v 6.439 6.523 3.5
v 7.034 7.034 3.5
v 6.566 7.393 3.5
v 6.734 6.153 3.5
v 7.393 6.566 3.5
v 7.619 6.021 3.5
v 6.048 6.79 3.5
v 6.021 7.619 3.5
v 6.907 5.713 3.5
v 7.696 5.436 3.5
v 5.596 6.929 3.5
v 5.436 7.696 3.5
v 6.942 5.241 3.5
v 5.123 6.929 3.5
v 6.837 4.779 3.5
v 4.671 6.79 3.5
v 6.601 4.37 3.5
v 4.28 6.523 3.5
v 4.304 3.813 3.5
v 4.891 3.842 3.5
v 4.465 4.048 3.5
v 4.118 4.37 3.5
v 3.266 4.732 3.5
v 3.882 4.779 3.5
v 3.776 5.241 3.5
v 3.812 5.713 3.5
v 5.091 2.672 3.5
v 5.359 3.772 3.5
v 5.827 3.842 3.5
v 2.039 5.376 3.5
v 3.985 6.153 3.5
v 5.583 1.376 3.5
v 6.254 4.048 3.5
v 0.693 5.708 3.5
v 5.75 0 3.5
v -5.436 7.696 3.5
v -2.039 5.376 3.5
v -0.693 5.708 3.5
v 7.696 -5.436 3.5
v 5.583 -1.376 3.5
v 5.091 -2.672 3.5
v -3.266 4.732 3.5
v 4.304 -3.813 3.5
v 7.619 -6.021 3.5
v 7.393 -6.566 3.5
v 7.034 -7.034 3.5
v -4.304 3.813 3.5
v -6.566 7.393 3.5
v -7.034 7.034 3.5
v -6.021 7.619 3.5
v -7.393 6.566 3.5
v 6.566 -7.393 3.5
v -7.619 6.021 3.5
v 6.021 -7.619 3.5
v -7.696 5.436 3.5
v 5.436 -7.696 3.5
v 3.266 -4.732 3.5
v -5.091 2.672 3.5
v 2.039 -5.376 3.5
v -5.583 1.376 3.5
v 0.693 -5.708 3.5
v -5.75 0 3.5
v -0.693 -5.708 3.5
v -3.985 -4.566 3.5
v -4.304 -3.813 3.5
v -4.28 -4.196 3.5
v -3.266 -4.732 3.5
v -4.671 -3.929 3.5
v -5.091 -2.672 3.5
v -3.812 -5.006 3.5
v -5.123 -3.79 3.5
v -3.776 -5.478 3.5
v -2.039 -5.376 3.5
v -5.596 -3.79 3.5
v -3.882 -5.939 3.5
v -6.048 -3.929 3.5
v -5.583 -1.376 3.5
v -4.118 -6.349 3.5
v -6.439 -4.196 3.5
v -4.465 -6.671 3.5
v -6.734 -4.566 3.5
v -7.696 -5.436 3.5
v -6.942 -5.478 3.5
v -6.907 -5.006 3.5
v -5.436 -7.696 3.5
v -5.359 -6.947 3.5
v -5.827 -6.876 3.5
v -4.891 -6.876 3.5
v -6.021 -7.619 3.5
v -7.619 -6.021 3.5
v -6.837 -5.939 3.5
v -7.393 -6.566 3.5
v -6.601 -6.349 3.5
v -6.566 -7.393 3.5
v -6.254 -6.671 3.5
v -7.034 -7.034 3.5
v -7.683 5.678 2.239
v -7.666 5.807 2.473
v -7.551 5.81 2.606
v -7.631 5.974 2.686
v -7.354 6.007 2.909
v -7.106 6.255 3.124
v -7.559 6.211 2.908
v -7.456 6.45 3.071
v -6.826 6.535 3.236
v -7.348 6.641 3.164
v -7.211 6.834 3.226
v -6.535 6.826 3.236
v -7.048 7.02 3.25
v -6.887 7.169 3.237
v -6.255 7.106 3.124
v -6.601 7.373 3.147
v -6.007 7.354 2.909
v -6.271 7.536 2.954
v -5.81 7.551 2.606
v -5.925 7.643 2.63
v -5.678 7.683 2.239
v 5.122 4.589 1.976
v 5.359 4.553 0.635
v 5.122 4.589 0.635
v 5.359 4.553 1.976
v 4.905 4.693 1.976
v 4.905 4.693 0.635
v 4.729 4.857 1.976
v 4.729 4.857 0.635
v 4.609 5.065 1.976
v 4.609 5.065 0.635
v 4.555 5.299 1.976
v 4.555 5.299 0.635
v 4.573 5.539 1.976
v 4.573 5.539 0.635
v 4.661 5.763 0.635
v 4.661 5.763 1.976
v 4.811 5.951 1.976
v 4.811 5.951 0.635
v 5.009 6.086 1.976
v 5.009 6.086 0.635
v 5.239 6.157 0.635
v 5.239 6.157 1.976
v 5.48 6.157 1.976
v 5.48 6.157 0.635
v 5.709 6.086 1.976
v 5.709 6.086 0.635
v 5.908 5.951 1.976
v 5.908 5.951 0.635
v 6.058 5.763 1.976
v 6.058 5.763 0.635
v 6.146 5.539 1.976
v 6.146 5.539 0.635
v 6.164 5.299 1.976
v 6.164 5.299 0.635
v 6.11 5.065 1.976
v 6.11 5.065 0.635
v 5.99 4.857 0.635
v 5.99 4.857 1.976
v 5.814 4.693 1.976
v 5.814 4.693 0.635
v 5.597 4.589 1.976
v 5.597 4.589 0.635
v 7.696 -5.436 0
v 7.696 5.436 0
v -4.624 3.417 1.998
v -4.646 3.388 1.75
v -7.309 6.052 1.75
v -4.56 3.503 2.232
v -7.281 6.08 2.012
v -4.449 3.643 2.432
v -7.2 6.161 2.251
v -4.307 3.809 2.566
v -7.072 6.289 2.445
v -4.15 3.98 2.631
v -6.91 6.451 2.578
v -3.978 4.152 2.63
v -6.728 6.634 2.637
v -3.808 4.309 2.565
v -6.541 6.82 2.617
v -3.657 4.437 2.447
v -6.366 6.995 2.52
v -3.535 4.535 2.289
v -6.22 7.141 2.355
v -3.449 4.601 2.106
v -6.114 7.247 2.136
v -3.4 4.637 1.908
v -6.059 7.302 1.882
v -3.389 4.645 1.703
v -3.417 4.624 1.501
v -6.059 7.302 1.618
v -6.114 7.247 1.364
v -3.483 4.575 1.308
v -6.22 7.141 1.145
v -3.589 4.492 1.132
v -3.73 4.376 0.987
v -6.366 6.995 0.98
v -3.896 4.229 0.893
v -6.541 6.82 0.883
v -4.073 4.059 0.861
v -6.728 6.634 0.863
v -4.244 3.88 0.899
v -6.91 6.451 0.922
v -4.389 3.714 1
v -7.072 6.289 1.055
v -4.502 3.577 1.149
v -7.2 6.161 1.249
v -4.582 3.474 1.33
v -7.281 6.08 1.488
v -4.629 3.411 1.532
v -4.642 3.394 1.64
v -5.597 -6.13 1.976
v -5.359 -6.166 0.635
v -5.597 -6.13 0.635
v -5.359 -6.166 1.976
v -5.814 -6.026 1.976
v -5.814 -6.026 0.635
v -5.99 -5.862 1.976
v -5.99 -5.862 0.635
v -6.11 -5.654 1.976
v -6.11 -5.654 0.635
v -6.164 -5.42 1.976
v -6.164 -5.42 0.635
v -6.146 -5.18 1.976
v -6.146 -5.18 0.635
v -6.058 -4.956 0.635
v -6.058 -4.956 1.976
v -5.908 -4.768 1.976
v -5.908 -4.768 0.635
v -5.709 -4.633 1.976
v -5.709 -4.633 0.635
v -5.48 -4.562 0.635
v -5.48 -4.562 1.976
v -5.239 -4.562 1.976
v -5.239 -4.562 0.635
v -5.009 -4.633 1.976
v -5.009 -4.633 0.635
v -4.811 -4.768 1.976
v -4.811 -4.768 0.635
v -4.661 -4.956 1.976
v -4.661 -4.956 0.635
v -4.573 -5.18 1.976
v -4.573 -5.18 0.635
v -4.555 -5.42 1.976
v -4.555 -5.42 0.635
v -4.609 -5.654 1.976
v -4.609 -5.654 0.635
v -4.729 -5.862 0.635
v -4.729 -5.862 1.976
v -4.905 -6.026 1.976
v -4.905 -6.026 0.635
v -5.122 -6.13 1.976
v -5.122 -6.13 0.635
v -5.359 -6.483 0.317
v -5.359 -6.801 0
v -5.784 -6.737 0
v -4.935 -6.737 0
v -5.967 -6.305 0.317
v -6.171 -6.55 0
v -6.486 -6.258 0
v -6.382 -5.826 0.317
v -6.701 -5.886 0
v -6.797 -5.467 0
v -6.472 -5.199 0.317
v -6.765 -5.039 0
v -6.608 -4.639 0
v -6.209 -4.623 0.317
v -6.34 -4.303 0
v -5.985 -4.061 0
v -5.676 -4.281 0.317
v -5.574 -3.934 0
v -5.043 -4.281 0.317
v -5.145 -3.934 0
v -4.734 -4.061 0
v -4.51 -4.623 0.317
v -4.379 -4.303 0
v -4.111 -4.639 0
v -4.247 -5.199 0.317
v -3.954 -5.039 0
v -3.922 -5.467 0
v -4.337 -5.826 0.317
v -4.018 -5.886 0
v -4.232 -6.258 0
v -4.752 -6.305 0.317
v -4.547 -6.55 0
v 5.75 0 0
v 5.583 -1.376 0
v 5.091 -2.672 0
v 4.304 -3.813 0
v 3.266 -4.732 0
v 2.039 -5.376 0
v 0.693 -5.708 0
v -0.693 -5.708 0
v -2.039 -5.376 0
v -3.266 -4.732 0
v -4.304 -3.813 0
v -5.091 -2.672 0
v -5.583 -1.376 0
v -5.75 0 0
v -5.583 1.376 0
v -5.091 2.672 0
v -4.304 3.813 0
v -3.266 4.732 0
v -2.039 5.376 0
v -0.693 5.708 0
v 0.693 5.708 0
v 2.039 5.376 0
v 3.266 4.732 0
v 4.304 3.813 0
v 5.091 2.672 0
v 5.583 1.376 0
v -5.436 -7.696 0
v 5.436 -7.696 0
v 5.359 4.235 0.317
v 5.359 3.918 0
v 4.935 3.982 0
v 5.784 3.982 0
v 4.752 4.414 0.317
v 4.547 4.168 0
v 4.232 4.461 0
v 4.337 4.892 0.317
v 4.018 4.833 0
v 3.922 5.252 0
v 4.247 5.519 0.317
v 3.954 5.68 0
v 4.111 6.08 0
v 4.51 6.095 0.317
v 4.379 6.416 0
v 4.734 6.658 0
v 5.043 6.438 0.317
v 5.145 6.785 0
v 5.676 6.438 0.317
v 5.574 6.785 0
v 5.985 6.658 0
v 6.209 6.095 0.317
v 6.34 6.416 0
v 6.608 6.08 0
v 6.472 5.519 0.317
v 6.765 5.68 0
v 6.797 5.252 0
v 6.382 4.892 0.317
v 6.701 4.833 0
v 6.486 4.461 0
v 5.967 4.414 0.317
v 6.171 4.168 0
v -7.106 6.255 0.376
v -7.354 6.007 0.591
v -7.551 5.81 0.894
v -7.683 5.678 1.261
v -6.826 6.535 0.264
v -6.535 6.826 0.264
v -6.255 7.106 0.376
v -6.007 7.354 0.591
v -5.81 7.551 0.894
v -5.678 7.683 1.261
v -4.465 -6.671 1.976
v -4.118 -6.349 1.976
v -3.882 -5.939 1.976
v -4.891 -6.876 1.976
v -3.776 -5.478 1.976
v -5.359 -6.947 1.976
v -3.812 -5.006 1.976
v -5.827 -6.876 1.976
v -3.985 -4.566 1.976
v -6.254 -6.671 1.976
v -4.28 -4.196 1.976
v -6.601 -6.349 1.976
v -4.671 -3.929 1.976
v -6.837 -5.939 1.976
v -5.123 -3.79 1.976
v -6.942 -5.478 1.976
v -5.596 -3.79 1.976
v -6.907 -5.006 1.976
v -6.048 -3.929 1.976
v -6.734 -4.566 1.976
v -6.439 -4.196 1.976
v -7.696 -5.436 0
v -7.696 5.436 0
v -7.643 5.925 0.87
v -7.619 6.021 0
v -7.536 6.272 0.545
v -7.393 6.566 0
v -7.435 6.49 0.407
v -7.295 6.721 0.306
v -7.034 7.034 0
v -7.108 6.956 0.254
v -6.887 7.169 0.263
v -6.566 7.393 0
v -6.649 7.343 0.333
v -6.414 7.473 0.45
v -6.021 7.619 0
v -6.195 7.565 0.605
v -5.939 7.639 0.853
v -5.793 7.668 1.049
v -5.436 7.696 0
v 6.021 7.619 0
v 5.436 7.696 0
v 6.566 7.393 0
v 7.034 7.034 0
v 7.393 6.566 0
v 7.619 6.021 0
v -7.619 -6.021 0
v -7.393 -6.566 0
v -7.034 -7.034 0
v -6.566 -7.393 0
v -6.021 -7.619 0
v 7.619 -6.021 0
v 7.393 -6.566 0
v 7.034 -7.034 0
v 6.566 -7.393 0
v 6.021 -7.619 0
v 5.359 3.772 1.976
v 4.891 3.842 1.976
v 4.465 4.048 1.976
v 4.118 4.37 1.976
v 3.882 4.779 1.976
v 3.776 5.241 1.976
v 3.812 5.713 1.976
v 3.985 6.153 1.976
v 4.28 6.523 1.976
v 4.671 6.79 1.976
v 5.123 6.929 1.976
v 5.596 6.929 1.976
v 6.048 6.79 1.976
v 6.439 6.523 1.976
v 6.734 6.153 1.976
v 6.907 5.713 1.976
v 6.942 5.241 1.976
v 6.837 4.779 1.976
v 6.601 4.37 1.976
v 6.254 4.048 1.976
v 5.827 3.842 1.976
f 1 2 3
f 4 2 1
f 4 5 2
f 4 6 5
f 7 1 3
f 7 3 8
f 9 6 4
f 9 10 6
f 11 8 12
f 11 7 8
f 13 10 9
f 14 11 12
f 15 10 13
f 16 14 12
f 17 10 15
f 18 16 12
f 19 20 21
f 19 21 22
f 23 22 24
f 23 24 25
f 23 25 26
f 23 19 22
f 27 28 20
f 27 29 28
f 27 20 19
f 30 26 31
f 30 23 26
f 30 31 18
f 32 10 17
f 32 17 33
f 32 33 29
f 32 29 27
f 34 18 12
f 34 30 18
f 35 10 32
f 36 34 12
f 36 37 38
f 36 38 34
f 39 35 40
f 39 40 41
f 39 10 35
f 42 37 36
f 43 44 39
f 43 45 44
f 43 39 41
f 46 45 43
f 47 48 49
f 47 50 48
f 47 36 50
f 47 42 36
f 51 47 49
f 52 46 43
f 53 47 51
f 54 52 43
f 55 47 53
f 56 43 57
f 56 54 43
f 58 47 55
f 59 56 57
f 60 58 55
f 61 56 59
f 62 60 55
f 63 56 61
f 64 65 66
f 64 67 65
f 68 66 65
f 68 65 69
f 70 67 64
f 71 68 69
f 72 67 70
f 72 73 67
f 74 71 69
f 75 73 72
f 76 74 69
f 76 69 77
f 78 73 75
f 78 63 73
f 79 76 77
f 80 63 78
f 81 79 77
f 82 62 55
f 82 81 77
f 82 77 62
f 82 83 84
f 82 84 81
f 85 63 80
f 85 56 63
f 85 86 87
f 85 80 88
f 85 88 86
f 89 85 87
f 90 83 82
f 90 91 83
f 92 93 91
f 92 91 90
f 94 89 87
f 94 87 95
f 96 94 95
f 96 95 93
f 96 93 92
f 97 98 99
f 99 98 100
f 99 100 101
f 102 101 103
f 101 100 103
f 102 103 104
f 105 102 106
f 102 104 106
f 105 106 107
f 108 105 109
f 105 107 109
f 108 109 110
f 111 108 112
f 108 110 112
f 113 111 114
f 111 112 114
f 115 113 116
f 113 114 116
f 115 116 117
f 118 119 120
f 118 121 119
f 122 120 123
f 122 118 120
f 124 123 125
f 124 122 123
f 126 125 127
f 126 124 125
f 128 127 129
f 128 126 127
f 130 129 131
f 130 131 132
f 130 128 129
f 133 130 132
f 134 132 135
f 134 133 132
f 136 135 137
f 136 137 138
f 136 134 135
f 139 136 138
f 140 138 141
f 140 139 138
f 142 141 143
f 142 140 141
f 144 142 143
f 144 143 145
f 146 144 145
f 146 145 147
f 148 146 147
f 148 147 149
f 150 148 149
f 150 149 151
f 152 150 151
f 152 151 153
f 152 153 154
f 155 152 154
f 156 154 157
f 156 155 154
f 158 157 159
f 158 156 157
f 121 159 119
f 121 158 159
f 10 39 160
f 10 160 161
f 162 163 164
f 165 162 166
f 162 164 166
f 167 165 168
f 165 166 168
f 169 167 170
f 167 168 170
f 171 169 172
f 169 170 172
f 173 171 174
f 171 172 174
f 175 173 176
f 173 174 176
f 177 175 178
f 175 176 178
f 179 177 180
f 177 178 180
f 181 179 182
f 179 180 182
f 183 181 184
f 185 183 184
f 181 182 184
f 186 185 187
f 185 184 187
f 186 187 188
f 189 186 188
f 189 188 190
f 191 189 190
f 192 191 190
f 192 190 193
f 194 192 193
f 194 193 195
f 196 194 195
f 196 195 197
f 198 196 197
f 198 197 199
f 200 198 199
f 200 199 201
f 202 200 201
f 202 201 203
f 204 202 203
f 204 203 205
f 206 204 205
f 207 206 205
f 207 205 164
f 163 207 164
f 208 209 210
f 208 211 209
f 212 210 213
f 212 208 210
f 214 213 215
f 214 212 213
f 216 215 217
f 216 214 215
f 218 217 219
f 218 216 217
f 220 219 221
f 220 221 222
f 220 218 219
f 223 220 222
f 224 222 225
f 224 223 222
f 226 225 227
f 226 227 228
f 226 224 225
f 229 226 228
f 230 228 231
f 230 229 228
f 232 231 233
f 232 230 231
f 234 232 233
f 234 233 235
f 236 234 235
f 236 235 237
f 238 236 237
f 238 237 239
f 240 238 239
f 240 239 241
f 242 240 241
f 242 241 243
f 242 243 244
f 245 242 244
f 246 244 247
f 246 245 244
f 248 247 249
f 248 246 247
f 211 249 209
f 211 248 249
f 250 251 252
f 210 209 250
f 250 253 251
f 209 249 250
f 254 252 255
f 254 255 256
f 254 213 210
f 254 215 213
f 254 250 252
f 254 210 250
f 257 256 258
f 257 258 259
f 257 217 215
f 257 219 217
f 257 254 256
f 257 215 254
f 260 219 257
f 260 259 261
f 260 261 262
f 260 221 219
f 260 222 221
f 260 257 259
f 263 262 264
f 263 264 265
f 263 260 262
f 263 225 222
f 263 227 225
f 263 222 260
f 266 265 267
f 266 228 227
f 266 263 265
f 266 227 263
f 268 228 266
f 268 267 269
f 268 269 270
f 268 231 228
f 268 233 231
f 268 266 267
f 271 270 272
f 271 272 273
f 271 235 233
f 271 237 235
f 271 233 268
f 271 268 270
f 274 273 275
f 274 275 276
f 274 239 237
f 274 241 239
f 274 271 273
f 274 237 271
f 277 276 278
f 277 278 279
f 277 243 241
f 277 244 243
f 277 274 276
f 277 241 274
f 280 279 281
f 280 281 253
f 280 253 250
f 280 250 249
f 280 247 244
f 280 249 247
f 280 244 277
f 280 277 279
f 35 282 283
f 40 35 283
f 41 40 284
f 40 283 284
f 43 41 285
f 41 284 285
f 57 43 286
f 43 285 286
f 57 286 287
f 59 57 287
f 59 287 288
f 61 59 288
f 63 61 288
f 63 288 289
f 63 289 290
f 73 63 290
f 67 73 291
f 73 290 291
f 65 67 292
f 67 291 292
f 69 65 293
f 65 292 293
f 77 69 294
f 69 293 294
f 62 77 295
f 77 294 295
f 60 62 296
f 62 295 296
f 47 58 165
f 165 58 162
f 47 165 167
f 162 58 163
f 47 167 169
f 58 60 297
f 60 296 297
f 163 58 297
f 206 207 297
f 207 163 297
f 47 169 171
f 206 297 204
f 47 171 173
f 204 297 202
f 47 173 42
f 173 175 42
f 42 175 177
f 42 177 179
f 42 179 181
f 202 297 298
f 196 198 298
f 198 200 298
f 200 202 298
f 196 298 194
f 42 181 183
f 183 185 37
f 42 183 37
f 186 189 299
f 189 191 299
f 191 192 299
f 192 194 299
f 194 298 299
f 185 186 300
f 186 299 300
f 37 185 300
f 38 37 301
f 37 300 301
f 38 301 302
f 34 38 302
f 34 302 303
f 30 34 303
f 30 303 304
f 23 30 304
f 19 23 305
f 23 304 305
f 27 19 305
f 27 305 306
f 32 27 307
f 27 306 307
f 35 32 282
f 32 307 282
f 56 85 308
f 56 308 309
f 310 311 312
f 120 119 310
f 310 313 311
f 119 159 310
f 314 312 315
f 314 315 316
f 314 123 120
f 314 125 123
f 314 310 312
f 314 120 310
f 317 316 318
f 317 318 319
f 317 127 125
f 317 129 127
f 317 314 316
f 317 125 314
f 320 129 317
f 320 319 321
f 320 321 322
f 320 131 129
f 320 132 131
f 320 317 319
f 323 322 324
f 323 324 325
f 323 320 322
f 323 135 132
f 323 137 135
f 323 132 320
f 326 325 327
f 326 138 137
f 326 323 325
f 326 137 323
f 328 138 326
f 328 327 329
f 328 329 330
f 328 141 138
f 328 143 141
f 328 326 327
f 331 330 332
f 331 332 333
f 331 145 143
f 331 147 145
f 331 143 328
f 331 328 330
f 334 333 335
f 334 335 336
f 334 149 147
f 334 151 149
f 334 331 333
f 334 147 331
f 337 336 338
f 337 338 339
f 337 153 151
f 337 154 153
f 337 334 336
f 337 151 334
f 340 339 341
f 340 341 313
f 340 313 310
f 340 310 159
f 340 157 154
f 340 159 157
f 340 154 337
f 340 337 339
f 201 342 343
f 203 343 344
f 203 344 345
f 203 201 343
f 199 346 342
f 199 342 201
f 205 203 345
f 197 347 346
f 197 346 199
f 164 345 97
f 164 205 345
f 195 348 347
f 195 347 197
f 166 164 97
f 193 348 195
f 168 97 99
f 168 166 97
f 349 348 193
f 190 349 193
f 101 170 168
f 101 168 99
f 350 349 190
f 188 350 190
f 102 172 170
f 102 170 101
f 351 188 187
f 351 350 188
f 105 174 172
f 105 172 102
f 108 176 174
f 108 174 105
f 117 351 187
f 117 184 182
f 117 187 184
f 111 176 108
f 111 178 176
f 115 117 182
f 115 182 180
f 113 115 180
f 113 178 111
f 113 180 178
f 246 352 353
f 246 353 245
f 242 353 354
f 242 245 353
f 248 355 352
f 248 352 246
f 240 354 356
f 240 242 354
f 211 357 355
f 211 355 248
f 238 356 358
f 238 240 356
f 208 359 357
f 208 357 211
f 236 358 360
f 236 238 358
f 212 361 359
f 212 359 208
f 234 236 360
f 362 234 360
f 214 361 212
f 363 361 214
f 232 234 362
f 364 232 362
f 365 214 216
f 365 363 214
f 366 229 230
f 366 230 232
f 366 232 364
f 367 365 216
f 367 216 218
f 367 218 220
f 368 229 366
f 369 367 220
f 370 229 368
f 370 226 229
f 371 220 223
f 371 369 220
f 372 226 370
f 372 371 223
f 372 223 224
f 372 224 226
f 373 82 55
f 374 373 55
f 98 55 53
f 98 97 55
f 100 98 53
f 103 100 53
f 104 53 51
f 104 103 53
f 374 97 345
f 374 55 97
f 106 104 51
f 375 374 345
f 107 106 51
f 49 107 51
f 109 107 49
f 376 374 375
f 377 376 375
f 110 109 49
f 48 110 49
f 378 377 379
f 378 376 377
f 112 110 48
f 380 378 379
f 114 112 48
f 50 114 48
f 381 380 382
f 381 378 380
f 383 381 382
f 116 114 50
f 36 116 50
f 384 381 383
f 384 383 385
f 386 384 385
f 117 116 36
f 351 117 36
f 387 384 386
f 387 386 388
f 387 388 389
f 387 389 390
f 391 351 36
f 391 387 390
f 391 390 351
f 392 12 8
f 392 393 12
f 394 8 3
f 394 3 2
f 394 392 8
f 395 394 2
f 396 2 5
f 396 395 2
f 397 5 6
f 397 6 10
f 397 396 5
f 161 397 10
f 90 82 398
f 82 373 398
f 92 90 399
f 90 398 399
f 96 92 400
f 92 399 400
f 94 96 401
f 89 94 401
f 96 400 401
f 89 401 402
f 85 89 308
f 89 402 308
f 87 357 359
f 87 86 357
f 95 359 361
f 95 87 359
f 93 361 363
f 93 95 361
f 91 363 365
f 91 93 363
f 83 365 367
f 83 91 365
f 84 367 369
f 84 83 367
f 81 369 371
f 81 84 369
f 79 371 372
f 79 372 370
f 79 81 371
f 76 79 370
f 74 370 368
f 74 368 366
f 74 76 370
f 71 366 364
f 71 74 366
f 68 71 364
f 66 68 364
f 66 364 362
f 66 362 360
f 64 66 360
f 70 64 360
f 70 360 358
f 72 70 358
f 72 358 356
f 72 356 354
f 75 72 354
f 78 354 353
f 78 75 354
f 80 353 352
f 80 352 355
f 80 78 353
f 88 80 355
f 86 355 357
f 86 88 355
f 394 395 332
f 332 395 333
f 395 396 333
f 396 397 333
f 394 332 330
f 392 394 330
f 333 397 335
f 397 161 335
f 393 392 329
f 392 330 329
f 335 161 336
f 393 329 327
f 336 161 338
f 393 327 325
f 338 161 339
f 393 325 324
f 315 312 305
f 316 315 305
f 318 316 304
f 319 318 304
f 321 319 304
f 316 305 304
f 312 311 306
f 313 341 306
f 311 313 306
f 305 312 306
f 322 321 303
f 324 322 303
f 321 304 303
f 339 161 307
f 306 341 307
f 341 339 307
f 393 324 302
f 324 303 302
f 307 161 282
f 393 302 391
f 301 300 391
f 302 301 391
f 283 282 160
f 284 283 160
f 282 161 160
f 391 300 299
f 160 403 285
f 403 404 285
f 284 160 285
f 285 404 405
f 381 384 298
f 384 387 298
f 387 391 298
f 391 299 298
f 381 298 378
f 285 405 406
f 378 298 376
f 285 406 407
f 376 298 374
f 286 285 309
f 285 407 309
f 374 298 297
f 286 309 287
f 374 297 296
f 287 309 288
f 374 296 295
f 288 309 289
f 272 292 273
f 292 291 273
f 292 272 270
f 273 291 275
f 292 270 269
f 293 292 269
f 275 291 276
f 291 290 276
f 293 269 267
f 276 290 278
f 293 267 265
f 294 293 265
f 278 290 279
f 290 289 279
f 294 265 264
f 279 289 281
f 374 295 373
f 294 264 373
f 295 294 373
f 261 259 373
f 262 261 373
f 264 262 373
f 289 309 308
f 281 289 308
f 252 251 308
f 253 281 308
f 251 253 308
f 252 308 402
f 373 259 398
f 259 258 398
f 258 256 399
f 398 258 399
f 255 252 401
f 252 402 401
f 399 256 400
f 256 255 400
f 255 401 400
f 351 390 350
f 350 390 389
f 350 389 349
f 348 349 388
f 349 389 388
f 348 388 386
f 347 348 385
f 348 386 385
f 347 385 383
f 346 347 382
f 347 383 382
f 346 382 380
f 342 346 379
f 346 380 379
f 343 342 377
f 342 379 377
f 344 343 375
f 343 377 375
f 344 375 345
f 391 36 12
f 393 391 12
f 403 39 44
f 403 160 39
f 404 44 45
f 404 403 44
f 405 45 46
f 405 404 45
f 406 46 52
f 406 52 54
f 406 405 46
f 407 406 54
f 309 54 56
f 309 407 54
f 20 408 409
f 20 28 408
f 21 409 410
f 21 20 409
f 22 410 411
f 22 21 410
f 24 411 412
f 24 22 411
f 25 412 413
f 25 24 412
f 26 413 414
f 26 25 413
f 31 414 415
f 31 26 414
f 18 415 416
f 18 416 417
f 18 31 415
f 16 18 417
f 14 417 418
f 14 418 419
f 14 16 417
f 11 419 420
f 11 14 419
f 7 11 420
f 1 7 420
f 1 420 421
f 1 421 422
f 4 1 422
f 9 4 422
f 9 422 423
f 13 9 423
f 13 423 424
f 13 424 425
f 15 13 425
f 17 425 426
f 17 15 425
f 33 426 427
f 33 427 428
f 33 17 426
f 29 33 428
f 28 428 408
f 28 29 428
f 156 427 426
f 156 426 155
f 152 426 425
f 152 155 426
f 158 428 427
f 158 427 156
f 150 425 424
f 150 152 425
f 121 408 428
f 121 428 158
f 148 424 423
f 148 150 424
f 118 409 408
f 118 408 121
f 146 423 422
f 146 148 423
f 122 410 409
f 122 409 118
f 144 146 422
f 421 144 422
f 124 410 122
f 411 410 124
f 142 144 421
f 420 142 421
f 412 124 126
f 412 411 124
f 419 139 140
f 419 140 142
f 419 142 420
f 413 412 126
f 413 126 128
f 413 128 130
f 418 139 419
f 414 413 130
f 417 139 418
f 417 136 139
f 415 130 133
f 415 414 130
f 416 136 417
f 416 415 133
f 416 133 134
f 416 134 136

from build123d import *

# Parameters (mm, degrees)
SKETCH1_W                                     = 3.5
SKETCH1_H                                     = 9.25
CBORE_FOR_0_SOCKET_HEAD_CAP_SCREW1_AT_2_COUNT = 2
CBORE_FOR_0_SOCKET_HEAD_CAP_SCREW1_AT_2_PITCH = 15.15867233
SKETCH5_OUTSIDE_W                             = 40.514
SKETCH5_OUTSIDE_H                             = 40.514
SKETCH5_OUTSIDE_W_2                           = 15.3924
SKETCH5_OUTSIDE_H_2                           = 15.3924
CUT_EXTRUDE1_DEPTH                            = 10
FILLET1_R                                     = 2.2606
SKETCH8_R                                     = 1.5
CUT_EXTRUDE2_DEPTH                            = 0.5
F_2_56_TAPPED_HOLE1_REACH                     = 22.332
F_2_56_TAPPED_HOLE1_BORE_R                    = 0.889


with BuildPart() as part:
    # Sketch1 → Revolve1 (revolve)
    with BuildSketch(Plane(origin=(0, 0, 0), x_dir=(0, 0, -1), z_dir=(1, 0, 0)), mode=Mode.PRIVATE) as revolve1_sk:
        with Locations((-1.75, 10.375)):
            Rectangle(SKETCH1_W, SKETCH1_H)
    revolve(revolve1_sk.sketch.rotate(Axis((0, 0, 0), (0, 0, -1)), 90), axis=Axis((0, 0, 0), (0, 0, -1)))  # turned: the seam where the file's is

    # Sketch3 → CBORE for #0 Socket Head Cap Screw1 (revolve, cut)
    with BuildSketch(Plane(origin=(5.359399999, 5.359399999, 3.5), x_dir=(0, -1, 0), z_dir=(1, 0, 0))):
        Polygon((0, 0), (0, 3.5), (1.44145, 3.5), (0.80645, 2.865), (0.80645, 1.524), (1.5875, 1.524), (1.5875, 0), align=None)
    cbore_for_0_socket_head_cap_screw1 = revolve(axis=Axis((5.359399999, 5.359399999, 9.85), (0, 0, -1)), mode=Mode.SUBTRACT)

    # CBORE for #0 Socket Head Cap Screw1 at 2: CBORE for #0 Socket Head Cap Screw1 ×2
    with Locations(*[Vector(-0.707106781, -0.707106781, 0) * (i * CBORE_FOR_0_SOCKET_HEAD_CAP_SCREW1_AT_2_PITCH) for i in range(1, CBORE_FOR_0_SOCKET_HEAD_CAP_SCREW1_AT_2_COUNT)]):
        add(cbore_for_0_socket_head_cap_screw1, mode=Mode.SUBTRACT)

    # Sketch5 outside → Cut-Extrude1 (cut)
    with BuildSketch(Plane.XY.offset(3.5)):
        Rectangle(SKETCH5_OUTSIDE_W, SKETCH5_OUTSIDE_H)
        Rectangle(SKETCH5_OUTSIDE_W_2, SKETCH5_OUTSIDE_H_2, mode=Mode.SUBTRACT)
    extrude(amount=-CUT_EXTRUDE1_DEPTH, mode=Mode.SUBTRACT)

    # Fillet1
    fillet1_edges = [part.edges().sort_by_distance(p)[0] for p in [
        (-7.6962, 7.6962, 1.75),
        (7.6962, 7.6962, 1.75),
        (7.6962, -7.6962, 1.75),
        (-7.6962, -7.6962, 1.75),
    ]]
    fillet(fillet1_edges, radius=FILLET1_R)

    # Sketch8 → Cut-Extrude2 (cut)
    with BuildSketch(Plane(origin=(-7.03408559, 7.03408559, 1.75), x_dir=(0, 0, 1), z_dir=(-0.707106781, 0.707106781, 0))):
        Circle(SKETCH8_R)
    extrude(amount=-CUT_EXTRUDE2_DEPTH, mode=Mode.SUBTRACT)

    # #2-56 Tapped Hole1 bore → #2-56 Tapped Hole1 (cut, up to next)
    with BuildSketch(Plane(origin=(-6.680532199, 6.680532199, 0), x_dir=(-0.707106781, -0.707106781, 0), z_dir=(-0.707106781, 0.707106781, 0)), mode=Mode.PRIVATE) as f_2_56_tapped_hole1_sk1:
        with Locations((0, 1.75)):
            Circle(F_2_56_TAPPED_HOLE1_BORE_R)
    f_2_56_tapped_hole1_tool1 = extrude(f_2_56_tapped_hole1_sk1.sketch, amount=-F_2_56_TAPPED_HOLE1_REACH, mode=Mode.PRIVATE) & part.part
    add(f_2_56_tapped_hole1_tool1.solids().sort_by_distance((-6.680532, 6.680532, 1.75))[0], mode=Mode.SUBTRACT)


solid = part.part
